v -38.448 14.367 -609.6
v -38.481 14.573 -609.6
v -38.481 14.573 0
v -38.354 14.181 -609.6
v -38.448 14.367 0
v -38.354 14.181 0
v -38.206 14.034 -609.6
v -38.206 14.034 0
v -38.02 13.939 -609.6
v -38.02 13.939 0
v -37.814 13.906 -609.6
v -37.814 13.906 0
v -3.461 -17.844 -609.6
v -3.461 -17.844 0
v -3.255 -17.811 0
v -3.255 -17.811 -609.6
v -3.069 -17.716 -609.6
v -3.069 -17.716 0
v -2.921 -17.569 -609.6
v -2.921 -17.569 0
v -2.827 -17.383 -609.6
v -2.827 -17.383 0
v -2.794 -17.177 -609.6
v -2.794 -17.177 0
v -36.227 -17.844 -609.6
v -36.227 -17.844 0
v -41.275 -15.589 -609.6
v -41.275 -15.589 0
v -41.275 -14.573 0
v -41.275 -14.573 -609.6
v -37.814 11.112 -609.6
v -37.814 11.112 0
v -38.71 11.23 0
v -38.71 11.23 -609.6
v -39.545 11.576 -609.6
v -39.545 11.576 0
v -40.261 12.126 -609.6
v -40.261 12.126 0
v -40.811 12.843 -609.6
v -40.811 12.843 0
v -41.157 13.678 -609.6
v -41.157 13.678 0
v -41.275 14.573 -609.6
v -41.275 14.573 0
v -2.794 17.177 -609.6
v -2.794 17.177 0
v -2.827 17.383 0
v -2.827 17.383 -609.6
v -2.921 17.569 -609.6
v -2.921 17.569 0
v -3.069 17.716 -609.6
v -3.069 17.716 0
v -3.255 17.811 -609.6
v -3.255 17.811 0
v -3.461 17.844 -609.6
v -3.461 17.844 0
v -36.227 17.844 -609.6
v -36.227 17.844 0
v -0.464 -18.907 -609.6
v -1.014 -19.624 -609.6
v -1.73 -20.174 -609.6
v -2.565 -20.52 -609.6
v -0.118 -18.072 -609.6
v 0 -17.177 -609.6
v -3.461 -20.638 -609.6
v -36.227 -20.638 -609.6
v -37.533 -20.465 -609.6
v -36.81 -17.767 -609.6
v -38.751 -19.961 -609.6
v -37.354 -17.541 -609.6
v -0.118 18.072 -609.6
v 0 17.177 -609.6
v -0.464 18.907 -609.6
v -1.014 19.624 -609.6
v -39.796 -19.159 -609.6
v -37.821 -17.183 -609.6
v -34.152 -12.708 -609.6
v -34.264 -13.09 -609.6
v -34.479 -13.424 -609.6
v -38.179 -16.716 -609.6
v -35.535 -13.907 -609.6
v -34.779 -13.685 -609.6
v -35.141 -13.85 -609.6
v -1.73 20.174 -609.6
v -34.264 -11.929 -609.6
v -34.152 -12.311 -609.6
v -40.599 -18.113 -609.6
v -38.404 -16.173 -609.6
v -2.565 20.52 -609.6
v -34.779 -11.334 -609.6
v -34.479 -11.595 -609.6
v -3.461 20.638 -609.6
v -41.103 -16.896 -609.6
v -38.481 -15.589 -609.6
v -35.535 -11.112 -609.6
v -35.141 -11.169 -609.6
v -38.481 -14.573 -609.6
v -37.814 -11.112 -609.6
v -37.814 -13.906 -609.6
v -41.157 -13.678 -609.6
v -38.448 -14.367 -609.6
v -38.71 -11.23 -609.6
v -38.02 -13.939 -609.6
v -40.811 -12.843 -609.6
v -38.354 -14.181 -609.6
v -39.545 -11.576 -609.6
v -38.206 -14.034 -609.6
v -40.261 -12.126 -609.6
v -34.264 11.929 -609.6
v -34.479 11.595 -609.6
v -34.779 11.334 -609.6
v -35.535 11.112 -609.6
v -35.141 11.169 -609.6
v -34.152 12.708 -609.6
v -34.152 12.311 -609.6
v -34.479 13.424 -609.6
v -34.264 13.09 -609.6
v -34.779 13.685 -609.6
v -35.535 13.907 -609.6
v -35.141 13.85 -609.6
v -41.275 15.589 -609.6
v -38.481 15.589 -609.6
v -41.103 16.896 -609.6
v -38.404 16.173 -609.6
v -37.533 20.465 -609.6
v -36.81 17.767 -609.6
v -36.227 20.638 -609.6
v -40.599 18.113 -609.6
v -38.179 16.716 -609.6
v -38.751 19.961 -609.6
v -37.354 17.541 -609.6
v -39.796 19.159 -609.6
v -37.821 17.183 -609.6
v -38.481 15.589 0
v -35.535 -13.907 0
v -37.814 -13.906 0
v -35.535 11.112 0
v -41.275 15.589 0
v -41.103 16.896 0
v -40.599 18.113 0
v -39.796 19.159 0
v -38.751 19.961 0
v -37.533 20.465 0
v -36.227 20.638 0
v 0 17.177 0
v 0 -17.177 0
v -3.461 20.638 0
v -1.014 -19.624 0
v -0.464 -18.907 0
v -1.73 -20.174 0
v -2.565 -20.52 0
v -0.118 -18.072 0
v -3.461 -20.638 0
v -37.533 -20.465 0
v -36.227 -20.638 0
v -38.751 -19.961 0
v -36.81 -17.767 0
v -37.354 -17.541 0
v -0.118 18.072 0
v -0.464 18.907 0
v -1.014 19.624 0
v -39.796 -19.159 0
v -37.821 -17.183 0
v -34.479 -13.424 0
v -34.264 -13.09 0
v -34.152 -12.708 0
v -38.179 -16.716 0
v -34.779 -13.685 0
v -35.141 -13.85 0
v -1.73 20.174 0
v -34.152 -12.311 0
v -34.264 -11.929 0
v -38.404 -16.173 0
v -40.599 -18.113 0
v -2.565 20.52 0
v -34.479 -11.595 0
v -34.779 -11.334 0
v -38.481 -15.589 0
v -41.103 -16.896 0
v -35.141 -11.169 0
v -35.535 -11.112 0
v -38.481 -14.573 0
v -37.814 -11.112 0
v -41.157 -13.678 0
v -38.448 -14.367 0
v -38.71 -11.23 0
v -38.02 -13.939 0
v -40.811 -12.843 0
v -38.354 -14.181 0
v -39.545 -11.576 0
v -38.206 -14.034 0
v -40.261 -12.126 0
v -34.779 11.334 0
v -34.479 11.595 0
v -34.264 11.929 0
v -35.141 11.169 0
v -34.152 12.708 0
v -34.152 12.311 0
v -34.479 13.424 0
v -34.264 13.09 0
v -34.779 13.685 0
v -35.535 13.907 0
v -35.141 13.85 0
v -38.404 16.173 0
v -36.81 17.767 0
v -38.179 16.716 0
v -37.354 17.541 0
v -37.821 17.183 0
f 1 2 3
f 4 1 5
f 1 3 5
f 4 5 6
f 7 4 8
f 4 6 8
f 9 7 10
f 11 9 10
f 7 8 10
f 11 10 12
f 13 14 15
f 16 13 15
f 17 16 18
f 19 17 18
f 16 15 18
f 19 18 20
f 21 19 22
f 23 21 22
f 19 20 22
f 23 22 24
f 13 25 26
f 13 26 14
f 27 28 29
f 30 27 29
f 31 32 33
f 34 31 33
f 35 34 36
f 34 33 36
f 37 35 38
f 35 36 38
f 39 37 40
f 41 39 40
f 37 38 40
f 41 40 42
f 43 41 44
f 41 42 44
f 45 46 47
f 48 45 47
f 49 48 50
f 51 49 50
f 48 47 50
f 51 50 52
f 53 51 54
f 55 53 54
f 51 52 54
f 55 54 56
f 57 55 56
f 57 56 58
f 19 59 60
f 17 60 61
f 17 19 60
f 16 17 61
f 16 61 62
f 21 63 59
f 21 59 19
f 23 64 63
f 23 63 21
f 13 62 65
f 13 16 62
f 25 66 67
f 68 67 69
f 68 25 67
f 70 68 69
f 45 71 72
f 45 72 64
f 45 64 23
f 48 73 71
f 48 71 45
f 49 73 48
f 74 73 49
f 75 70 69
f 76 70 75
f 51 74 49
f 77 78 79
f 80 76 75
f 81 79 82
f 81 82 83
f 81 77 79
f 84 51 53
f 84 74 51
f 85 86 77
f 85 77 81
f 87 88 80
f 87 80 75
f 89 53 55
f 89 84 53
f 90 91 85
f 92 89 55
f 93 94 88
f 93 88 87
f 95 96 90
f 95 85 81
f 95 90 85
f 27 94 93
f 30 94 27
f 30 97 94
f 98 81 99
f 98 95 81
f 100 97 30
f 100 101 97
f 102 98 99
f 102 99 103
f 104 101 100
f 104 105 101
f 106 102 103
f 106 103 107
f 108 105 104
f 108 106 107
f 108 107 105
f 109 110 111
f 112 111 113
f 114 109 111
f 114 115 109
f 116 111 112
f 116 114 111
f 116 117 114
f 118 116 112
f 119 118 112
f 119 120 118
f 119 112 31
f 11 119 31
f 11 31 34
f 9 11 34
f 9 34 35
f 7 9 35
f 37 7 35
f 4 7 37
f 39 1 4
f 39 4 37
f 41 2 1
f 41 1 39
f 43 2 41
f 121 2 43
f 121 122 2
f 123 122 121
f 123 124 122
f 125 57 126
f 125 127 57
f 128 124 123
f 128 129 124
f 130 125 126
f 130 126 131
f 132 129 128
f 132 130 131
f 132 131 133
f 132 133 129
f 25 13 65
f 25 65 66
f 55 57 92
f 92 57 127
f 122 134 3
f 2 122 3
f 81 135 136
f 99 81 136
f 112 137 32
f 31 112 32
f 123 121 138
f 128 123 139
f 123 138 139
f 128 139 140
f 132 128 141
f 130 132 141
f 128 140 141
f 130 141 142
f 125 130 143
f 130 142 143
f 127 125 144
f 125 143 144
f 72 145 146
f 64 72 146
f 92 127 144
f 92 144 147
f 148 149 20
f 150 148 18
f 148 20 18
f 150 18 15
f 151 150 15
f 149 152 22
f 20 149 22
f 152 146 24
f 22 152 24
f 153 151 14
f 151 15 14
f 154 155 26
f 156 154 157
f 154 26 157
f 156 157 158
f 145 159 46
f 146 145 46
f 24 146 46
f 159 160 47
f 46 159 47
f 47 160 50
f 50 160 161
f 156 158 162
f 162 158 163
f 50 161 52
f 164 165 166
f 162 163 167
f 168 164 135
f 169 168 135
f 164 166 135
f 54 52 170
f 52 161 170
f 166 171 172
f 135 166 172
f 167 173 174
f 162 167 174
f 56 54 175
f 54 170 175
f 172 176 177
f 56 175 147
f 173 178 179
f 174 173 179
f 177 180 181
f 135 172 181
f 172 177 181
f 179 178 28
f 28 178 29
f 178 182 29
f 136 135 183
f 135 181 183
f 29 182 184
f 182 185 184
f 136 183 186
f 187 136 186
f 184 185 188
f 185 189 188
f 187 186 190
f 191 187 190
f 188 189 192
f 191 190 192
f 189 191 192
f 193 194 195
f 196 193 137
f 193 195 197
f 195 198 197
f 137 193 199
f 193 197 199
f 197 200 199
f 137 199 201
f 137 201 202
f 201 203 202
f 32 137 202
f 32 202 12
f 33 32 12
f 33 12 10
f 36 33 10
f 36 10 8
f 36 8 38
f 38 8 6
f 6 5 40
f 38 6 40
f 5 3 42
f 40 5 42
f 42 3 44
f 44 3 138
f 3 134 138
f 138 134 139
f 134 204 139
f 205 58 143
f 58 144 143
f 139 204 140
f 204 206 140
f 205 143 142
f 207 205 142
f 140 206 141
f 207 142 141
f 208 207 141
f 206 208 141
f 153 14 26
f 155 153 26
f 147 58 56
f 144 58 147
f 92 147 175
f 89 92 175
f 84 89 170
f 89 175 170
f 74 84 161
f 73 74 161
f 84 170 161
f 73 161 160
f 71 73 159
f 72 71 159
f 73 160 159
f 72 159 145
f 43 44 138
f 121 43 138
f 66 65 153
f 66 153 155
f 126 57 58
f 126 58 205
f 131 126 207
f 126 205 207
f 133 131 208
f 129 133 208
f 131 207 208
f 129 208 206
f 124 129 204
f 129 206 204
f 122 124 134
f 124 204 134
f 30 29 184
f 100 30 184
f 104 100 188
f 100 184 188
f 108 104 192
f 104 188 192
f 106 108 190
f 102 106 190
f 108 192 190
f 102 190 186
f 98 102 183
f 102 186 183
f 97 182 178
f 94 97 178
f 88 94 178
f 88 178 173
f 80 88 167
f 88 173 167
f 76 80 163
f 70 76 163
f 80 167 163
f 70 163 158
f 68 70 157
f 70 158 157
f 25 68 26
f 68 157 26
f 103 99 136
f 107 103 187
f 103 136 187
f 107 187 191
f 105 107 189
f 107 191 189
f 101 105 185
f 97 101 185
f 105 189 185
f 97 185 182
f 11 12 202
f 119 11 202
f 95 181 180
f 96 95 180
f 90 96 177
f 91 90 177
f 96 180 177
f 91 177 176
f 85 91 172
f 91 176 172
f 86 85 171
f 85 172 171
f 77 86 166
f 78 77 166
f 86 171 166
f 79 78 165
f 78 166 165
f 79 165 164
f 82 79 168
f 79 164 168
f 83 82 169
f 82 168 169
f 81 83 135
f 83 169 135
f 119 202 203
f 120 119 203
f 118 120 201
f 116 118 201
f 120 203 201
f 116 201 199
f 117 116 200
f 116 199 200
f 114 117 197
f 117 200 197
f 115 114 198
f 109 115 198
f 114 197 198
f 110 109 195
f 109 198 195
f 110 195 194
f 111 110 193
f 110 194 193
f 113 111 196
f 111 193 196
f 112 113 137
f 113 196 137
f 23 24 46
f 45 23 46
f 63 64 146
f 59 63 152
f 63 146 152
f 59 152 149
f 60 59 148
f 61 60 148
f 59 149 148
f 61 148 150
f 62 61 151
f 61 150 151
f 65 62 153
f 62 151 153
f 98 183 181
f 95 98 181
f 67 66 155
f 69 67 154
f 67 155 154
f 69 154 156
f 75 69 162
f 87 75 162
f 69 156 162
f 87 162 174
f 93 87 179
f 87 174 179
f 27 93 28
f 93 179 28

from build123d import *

# Parameters (mm, degrees)
BOSS_EXTRUDE1_DEPTH = 609.6


with BuildPart() as part:
    # Sketch1 → Boss-Extrude1 (new body)
    with BuildSketch(Plane.XY):
        with BuildLine():
            Line((-36.22675, 20.6375), (-3.46075, 20.6375))
            ThreePointArc((-3.46075, 20.6375), (-1.013630207, 19.623869793), (0, 17.17675))
            Line((0, 17.17675), (0, -17.17675))
            ThreePointArc((0, -17.17675), (-1.013630207, -19.623869793), (-3.46075, -20.6375))
            Line((-3.46075, -20.6375), (-36.22675, -20.6375))
            ThreePointArc((-36.22675, -20.6375), (-39.796401808, -19.158901808), (-41.275, -15.58925))
            Line((-41.275, -15.58925), (-41.275, -14.57325))
            ThreePointArc((-41.275, -14.57325), (-40.261369793, -12.126130207), (-37.81425, -11.1125))
            Line((-37.81425, -11.1125), (-35.5346, -11.1125))
            ThreePointArc((-35.5346, -11.1125), (-34.1376, -12.5095), (-35.5346, -13.9065))
            Line((-35.5346, -13.9065), (-37.81425, -13.9065))
            ThreePointArc((-37.81425, -13.9065), (-38.285713446, -14.101786554), (-38.481, -14.57325))
            Line((-38.481, -14.57325), (-38.481, -15.58925))
            ThreePointArc((-38.481, -15.58925), (-37.820745461, -17.183245461), (-36.22675, -17.8435))
            Line((-36.22675, -17.8435), (-3.46075, -17.8435))
            ThreePointArc((-3.46075, -17.8435), (-2.989286554, -17.648213446), (-2.794, -17.17675))
            Line((-2.794, -17.17675), (-2.794, 17.17675))
            ThreePointArc((-2.794, 17.17675), (-2.989286554, 17.648213446), (-3.46075, 17.8435))
            Line((-3.46075, 17.8435), (-36.22675, 17.8435))
            ThreePointArc((-36.22675, 17.8435), (-37.820745461, 17.183245461), (-38.481, 15.58925))
            Line((-38.481, 15.58925), (-38.481, 14.57325))
            ThreePointArc((-38.481, 14.57325), (-38.285713446, 14.101786554), (-37.81425, 13.9065))
            Line((-37.81425, 13.9065), (-35.5346, 13.9065))
            ThreePointArc((-35.5346, 13.9065), (-34.1376, 12.5095), (-35.5346, 11.1125))
            Line((-35.5346, 11.1125), (-37.81425, 11.1125))
            ThreePointArc((-37.81425, 11.1125), (-40.261369793, 12.126130207), (-41.275, 14.57325))
            Line((-41.275, 14.57325), (-41.275, 15.58925))
            ThreePointArc((-41.275, 15.58925), (-39.796401808, 19.158901808), (-36.22675, 20.6375))
        make_face()
    extrude(amount=-BOSS_EXTRUDE1_DEPTH)


solid = part.part
